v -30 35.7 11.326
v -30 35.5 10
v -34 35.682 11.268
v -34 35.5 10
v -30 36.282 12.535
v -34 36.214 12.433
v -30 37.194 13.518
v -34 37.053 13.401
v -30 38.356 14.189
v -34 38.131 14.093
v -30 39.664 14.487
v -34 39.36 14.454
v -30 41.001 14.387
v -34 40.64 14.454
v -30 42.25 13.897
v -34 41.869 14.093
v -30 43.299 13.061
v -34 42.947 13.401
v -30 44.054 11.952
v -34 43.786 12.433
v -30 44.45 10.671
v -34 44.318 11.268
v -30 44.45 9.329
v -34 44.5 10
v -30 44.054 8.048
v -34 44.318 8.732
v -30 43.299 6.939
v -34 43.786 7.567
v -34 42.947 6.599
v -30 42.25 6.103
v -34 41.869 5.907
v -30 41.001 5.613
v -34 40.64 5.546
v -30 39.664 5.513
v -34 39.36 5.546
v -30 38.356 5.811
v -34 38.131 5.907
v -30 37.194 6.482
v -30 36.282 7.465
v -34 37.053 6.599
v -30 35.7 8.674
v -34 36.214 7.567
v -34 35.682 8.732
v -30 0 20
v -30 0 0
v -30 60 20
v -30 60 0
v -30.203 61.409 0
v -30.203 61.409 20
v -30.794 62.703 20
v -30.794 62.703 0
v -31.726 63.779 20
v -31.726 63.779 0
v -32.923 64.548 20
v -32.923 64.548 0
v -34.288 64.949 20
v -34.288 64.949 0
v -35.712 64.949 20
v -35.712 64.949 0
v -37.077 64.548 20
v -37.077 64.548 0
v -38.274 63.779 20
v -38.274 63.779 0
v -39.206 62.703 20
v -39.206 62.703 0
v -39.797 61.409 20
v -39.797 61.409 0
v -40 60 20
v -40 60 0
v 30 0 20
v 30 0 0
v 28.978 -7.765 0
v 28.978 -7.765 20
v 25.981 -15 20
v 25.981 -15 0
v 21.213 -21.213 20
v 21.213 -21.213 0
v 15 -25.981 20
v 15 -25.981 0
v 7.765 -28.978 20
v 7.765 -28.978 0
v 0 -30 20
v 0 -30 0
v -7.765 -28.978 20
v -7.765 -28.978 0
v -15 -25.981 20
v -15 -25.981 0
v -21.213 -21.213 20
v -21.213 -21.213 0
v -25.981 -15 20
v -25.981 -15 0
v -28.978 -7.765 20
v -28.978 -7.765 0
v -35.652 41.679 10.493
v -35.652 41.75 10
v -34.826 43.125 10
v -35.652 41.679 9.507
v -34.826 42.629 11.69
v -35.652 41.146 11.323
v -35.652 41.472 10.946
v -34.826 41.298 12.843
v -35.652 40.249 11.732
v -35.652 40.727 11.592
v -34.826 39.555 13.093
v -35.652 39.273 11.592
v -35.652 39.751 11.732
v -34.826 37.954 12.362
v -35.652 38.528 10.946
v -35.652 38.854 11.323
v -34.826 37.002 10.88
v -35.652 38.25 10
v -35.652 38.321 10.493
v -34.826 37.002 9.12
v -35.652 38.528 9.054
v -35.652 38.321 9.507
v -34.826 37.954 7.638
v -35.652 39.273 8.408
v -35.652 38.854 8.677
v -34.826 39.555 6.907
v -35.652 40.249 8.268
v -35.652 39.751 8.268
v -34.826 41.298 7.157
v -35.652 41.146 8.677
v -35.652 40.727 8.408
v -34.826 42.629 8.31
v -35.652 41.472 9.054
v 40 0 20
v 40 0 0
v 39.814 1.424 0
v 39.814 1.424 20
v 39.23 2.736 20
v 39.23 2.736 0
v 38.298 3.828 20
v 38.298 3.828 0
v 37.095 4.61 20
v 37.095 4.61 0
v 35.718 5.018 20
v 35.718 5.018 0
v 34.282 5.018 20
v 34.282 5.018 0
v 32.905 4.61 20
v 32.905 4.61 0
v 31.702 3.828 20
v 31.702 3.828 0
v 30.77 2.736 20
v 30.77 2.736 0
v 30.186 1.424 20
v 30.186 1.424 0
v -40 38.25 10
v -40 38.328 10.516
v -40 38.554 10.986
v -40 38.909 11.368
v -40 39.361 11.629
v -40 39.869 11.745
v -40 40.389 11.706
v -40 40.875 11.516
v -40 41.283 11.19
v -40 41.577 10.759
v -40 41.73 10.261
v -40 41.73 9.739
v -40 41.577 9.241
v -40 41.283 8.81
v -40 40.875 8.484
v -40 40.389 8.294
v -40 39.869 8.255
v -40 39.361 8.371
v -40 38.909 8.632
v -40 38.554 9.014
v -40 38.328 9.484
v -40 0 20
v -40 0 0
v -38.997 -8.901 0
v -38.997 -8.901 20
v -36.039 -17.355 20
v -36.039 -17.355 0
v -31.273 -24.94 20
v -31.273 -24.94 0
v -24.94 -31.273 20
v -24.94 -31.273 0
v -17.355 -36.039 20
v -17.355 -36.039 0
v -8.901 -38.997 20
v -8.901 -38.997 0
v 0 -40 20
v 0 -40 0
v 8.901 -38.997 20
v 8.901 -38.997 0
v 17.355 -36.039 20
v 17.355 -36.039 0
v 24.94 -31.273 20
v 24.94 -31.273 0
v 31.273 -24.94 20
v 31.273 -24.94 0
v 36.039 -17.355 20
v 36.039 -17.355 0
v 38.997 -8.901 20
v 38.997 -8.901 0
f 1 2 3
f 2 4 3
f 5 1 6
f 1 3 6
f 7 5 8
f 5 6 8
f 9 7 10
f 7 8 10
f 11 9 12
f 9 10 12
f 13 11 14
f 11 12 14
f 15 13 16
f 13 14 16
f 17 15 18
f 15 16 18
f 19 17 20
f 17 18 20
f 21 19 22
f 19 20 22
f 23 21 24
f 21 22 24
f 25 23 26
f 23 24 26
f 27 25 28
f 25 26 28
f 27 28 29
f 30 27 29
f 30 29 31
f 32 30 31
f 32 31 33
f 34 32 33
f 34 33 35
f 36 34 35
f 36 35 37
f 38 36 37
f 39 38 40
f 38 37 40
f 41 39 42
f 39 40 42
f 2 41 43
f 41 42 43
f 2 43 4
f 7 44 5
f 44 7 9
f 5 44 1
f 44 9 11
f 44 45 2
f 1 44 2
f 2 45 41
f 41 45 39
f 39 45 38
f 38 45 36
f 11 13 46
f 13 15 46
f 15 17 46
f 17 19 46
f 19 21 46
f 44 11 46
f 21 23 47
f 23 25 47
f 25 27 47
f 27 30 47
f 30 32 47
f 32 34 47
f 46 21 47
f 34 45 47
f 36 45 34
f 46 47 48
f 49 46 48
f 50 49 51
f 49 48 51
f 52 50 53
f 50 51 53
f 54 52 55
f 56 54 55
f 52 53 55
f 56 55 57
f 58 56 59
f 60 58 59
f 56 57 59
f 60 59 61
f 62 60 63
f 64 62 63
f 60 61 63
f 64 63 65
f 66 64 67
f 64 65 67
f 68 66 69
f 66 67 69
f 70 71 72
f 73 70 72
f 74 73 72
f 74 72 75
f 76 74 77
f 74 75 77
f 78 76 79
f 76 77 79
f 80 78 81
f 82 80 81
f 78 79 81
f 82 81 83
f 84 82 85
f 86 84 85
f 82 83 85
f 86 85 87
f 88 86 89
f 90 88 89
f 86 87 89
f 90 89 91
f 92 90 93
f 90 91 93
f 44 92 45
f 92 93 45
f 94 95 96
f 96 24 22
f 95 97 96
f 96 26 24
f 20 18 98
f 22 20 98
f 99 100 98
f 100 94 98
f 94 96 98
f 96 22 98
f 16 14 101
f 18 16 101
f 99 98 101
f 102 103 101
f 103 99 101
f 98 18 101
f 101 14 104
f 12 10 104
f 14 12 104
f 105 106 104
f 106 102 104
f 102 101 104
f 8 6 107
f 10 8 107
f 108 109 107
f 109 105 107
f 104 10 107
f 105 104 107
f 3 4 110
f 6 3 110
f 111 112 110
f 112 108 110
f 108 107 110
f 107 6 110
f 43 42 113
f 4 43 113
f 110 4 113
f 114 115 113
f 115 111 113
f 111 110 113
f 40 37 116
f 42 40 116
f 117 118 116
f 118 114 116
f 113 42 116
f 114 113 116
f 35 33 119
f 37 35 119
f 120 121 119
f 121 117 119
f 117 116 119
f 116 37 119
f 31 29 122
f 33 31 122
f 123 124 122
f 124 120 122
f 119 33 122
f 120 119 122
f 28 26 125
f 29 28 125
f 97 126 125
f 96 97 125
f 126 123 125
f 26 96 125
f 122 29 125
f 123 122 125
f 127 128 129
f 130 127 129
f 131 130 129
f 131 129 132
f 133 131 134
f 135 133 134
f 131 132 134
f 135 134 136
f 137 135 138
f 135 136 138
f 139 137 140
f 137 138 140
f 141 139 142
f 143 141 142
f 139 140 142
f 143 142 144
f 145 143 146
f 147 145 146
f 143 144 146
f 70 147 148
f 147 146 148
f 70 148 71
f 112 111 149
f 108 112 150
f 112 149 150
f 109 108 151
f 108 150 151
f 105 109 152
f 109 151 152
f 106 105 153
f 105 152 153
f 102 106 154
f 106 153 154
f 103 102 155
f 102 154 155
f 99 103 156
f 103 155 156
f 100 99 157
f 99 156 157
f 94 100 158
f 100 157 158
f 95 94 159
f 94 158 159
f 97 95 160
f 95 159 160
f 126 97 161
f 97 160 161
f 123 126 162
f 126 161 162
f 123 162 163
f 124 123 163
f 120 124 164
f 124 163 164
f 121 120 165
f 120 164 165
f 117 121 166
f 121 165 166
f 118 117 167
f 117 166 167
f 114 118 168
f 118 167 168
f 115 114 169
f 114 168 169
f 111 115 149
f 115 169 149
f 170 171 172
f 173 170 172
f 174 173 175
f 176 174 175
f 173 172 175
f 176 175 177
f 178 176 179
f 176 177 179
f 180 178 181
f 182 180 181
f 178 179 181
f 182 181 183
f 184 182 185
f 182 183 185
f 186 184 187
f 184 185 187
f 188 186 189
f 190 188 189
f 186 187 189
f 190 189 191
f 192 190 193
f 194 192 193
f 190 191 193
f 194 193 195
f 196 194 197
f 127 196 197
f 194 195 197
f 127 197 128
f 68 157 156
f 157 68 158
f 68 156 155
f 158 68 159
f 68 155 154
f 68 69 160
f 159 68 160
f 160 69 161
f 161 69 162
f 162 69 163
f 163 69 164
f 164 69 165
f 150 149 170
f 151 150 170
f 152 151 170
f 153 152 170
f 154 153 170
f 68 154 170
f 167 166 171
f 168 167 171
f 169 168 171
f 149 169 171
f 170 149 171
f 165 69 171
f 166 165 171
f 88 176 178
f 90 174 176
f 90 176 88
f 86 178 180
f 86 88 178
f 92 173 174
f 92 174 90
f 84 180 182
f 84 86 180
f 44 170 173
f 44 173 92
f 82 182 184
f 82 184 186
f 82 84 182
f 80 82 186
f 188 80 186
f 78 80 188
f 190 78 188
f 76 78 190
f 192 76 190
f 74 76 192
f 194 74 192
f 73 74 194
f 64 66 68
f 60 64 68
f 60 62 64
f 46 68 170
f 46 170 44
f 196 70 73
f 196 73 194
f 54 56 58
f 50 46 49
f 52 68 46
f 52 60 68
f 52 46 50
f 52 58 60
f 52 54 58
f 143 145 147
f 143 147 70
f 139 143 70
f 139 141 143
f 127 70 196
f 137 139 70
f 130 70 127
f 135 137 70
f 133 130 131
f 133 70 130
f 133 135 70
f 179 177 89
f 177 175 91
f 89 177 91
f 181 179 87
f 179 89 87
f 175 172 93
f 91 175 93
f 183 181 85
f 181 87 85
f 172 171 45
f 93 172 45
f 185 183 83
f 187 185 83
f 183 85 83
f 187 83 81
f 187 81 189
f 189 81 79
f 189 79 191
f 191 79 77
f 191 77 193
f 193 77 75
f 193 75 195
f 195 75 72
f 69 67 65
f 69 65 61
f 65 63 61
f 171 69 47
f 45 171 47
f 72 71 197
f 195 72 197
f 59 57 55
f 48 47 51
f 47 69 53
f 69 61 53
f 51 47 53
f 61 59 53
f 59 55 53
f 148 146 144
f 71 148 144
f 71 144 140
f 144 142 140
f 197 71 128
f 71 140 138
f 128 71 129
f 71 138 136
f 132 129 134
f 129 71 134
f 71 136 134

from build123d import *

# Parameters (mm, degrees)
F6_DEPTH = 20
F8_D     = 3.5
F8_DEPTH = 10
F8_TIP   = 1.0515060833
F9_D     = 9
F9_DEPTH = 4
F9_TIP   = 2.7038727856


with BuildPart() as f6:
    # F5 (on Top) → F6 (new body)
    with BuildSketch(Plane.XY):
        with BuildLine():
            ThreePointArc((30, 0), (0, -30), (-30, 0))
            Line((-30, 0), (-30, 60))
            ThreePointArc((-30, 60), (-35, 65), (-40, 60))
            Line((-40, 60), (-40, 0))
            ThreePointArc((-40, 0), (0, -40), (40, 0))
            ThreePointArc((40, 0), (35, 5.0700953218), (30, 0))
        make_face()
    extrude(amount=F6_DEPTH)

    # F8
    with Locations(Plane.YZ.offset(-30)):
        with Locations((40, 10)):
            Hole(F8_D / 2, depth=F8_DEPTH)
            with Locations((0, 0, -(F8_DEPTH + F8_TIP / 2))):  # 118° drill point
                Cone(0, F8_D / 2, F8_TIP, mode=Mode.SUBTRACT)

    # F9
    with Locations(Plane.YZ.offset(-30)):
        with Locations((40, 10)):
            Hole(F9_D / 2, depth=F9_DEPTH)
            with Locations((0, 0, -(F9_DEPTH + F9_TIP / 2))):  # 118° drill point
                Cone(0, F9_D / 2, F9_TIP, mode=Mode.SUBTRACT)


solid = f6.part
